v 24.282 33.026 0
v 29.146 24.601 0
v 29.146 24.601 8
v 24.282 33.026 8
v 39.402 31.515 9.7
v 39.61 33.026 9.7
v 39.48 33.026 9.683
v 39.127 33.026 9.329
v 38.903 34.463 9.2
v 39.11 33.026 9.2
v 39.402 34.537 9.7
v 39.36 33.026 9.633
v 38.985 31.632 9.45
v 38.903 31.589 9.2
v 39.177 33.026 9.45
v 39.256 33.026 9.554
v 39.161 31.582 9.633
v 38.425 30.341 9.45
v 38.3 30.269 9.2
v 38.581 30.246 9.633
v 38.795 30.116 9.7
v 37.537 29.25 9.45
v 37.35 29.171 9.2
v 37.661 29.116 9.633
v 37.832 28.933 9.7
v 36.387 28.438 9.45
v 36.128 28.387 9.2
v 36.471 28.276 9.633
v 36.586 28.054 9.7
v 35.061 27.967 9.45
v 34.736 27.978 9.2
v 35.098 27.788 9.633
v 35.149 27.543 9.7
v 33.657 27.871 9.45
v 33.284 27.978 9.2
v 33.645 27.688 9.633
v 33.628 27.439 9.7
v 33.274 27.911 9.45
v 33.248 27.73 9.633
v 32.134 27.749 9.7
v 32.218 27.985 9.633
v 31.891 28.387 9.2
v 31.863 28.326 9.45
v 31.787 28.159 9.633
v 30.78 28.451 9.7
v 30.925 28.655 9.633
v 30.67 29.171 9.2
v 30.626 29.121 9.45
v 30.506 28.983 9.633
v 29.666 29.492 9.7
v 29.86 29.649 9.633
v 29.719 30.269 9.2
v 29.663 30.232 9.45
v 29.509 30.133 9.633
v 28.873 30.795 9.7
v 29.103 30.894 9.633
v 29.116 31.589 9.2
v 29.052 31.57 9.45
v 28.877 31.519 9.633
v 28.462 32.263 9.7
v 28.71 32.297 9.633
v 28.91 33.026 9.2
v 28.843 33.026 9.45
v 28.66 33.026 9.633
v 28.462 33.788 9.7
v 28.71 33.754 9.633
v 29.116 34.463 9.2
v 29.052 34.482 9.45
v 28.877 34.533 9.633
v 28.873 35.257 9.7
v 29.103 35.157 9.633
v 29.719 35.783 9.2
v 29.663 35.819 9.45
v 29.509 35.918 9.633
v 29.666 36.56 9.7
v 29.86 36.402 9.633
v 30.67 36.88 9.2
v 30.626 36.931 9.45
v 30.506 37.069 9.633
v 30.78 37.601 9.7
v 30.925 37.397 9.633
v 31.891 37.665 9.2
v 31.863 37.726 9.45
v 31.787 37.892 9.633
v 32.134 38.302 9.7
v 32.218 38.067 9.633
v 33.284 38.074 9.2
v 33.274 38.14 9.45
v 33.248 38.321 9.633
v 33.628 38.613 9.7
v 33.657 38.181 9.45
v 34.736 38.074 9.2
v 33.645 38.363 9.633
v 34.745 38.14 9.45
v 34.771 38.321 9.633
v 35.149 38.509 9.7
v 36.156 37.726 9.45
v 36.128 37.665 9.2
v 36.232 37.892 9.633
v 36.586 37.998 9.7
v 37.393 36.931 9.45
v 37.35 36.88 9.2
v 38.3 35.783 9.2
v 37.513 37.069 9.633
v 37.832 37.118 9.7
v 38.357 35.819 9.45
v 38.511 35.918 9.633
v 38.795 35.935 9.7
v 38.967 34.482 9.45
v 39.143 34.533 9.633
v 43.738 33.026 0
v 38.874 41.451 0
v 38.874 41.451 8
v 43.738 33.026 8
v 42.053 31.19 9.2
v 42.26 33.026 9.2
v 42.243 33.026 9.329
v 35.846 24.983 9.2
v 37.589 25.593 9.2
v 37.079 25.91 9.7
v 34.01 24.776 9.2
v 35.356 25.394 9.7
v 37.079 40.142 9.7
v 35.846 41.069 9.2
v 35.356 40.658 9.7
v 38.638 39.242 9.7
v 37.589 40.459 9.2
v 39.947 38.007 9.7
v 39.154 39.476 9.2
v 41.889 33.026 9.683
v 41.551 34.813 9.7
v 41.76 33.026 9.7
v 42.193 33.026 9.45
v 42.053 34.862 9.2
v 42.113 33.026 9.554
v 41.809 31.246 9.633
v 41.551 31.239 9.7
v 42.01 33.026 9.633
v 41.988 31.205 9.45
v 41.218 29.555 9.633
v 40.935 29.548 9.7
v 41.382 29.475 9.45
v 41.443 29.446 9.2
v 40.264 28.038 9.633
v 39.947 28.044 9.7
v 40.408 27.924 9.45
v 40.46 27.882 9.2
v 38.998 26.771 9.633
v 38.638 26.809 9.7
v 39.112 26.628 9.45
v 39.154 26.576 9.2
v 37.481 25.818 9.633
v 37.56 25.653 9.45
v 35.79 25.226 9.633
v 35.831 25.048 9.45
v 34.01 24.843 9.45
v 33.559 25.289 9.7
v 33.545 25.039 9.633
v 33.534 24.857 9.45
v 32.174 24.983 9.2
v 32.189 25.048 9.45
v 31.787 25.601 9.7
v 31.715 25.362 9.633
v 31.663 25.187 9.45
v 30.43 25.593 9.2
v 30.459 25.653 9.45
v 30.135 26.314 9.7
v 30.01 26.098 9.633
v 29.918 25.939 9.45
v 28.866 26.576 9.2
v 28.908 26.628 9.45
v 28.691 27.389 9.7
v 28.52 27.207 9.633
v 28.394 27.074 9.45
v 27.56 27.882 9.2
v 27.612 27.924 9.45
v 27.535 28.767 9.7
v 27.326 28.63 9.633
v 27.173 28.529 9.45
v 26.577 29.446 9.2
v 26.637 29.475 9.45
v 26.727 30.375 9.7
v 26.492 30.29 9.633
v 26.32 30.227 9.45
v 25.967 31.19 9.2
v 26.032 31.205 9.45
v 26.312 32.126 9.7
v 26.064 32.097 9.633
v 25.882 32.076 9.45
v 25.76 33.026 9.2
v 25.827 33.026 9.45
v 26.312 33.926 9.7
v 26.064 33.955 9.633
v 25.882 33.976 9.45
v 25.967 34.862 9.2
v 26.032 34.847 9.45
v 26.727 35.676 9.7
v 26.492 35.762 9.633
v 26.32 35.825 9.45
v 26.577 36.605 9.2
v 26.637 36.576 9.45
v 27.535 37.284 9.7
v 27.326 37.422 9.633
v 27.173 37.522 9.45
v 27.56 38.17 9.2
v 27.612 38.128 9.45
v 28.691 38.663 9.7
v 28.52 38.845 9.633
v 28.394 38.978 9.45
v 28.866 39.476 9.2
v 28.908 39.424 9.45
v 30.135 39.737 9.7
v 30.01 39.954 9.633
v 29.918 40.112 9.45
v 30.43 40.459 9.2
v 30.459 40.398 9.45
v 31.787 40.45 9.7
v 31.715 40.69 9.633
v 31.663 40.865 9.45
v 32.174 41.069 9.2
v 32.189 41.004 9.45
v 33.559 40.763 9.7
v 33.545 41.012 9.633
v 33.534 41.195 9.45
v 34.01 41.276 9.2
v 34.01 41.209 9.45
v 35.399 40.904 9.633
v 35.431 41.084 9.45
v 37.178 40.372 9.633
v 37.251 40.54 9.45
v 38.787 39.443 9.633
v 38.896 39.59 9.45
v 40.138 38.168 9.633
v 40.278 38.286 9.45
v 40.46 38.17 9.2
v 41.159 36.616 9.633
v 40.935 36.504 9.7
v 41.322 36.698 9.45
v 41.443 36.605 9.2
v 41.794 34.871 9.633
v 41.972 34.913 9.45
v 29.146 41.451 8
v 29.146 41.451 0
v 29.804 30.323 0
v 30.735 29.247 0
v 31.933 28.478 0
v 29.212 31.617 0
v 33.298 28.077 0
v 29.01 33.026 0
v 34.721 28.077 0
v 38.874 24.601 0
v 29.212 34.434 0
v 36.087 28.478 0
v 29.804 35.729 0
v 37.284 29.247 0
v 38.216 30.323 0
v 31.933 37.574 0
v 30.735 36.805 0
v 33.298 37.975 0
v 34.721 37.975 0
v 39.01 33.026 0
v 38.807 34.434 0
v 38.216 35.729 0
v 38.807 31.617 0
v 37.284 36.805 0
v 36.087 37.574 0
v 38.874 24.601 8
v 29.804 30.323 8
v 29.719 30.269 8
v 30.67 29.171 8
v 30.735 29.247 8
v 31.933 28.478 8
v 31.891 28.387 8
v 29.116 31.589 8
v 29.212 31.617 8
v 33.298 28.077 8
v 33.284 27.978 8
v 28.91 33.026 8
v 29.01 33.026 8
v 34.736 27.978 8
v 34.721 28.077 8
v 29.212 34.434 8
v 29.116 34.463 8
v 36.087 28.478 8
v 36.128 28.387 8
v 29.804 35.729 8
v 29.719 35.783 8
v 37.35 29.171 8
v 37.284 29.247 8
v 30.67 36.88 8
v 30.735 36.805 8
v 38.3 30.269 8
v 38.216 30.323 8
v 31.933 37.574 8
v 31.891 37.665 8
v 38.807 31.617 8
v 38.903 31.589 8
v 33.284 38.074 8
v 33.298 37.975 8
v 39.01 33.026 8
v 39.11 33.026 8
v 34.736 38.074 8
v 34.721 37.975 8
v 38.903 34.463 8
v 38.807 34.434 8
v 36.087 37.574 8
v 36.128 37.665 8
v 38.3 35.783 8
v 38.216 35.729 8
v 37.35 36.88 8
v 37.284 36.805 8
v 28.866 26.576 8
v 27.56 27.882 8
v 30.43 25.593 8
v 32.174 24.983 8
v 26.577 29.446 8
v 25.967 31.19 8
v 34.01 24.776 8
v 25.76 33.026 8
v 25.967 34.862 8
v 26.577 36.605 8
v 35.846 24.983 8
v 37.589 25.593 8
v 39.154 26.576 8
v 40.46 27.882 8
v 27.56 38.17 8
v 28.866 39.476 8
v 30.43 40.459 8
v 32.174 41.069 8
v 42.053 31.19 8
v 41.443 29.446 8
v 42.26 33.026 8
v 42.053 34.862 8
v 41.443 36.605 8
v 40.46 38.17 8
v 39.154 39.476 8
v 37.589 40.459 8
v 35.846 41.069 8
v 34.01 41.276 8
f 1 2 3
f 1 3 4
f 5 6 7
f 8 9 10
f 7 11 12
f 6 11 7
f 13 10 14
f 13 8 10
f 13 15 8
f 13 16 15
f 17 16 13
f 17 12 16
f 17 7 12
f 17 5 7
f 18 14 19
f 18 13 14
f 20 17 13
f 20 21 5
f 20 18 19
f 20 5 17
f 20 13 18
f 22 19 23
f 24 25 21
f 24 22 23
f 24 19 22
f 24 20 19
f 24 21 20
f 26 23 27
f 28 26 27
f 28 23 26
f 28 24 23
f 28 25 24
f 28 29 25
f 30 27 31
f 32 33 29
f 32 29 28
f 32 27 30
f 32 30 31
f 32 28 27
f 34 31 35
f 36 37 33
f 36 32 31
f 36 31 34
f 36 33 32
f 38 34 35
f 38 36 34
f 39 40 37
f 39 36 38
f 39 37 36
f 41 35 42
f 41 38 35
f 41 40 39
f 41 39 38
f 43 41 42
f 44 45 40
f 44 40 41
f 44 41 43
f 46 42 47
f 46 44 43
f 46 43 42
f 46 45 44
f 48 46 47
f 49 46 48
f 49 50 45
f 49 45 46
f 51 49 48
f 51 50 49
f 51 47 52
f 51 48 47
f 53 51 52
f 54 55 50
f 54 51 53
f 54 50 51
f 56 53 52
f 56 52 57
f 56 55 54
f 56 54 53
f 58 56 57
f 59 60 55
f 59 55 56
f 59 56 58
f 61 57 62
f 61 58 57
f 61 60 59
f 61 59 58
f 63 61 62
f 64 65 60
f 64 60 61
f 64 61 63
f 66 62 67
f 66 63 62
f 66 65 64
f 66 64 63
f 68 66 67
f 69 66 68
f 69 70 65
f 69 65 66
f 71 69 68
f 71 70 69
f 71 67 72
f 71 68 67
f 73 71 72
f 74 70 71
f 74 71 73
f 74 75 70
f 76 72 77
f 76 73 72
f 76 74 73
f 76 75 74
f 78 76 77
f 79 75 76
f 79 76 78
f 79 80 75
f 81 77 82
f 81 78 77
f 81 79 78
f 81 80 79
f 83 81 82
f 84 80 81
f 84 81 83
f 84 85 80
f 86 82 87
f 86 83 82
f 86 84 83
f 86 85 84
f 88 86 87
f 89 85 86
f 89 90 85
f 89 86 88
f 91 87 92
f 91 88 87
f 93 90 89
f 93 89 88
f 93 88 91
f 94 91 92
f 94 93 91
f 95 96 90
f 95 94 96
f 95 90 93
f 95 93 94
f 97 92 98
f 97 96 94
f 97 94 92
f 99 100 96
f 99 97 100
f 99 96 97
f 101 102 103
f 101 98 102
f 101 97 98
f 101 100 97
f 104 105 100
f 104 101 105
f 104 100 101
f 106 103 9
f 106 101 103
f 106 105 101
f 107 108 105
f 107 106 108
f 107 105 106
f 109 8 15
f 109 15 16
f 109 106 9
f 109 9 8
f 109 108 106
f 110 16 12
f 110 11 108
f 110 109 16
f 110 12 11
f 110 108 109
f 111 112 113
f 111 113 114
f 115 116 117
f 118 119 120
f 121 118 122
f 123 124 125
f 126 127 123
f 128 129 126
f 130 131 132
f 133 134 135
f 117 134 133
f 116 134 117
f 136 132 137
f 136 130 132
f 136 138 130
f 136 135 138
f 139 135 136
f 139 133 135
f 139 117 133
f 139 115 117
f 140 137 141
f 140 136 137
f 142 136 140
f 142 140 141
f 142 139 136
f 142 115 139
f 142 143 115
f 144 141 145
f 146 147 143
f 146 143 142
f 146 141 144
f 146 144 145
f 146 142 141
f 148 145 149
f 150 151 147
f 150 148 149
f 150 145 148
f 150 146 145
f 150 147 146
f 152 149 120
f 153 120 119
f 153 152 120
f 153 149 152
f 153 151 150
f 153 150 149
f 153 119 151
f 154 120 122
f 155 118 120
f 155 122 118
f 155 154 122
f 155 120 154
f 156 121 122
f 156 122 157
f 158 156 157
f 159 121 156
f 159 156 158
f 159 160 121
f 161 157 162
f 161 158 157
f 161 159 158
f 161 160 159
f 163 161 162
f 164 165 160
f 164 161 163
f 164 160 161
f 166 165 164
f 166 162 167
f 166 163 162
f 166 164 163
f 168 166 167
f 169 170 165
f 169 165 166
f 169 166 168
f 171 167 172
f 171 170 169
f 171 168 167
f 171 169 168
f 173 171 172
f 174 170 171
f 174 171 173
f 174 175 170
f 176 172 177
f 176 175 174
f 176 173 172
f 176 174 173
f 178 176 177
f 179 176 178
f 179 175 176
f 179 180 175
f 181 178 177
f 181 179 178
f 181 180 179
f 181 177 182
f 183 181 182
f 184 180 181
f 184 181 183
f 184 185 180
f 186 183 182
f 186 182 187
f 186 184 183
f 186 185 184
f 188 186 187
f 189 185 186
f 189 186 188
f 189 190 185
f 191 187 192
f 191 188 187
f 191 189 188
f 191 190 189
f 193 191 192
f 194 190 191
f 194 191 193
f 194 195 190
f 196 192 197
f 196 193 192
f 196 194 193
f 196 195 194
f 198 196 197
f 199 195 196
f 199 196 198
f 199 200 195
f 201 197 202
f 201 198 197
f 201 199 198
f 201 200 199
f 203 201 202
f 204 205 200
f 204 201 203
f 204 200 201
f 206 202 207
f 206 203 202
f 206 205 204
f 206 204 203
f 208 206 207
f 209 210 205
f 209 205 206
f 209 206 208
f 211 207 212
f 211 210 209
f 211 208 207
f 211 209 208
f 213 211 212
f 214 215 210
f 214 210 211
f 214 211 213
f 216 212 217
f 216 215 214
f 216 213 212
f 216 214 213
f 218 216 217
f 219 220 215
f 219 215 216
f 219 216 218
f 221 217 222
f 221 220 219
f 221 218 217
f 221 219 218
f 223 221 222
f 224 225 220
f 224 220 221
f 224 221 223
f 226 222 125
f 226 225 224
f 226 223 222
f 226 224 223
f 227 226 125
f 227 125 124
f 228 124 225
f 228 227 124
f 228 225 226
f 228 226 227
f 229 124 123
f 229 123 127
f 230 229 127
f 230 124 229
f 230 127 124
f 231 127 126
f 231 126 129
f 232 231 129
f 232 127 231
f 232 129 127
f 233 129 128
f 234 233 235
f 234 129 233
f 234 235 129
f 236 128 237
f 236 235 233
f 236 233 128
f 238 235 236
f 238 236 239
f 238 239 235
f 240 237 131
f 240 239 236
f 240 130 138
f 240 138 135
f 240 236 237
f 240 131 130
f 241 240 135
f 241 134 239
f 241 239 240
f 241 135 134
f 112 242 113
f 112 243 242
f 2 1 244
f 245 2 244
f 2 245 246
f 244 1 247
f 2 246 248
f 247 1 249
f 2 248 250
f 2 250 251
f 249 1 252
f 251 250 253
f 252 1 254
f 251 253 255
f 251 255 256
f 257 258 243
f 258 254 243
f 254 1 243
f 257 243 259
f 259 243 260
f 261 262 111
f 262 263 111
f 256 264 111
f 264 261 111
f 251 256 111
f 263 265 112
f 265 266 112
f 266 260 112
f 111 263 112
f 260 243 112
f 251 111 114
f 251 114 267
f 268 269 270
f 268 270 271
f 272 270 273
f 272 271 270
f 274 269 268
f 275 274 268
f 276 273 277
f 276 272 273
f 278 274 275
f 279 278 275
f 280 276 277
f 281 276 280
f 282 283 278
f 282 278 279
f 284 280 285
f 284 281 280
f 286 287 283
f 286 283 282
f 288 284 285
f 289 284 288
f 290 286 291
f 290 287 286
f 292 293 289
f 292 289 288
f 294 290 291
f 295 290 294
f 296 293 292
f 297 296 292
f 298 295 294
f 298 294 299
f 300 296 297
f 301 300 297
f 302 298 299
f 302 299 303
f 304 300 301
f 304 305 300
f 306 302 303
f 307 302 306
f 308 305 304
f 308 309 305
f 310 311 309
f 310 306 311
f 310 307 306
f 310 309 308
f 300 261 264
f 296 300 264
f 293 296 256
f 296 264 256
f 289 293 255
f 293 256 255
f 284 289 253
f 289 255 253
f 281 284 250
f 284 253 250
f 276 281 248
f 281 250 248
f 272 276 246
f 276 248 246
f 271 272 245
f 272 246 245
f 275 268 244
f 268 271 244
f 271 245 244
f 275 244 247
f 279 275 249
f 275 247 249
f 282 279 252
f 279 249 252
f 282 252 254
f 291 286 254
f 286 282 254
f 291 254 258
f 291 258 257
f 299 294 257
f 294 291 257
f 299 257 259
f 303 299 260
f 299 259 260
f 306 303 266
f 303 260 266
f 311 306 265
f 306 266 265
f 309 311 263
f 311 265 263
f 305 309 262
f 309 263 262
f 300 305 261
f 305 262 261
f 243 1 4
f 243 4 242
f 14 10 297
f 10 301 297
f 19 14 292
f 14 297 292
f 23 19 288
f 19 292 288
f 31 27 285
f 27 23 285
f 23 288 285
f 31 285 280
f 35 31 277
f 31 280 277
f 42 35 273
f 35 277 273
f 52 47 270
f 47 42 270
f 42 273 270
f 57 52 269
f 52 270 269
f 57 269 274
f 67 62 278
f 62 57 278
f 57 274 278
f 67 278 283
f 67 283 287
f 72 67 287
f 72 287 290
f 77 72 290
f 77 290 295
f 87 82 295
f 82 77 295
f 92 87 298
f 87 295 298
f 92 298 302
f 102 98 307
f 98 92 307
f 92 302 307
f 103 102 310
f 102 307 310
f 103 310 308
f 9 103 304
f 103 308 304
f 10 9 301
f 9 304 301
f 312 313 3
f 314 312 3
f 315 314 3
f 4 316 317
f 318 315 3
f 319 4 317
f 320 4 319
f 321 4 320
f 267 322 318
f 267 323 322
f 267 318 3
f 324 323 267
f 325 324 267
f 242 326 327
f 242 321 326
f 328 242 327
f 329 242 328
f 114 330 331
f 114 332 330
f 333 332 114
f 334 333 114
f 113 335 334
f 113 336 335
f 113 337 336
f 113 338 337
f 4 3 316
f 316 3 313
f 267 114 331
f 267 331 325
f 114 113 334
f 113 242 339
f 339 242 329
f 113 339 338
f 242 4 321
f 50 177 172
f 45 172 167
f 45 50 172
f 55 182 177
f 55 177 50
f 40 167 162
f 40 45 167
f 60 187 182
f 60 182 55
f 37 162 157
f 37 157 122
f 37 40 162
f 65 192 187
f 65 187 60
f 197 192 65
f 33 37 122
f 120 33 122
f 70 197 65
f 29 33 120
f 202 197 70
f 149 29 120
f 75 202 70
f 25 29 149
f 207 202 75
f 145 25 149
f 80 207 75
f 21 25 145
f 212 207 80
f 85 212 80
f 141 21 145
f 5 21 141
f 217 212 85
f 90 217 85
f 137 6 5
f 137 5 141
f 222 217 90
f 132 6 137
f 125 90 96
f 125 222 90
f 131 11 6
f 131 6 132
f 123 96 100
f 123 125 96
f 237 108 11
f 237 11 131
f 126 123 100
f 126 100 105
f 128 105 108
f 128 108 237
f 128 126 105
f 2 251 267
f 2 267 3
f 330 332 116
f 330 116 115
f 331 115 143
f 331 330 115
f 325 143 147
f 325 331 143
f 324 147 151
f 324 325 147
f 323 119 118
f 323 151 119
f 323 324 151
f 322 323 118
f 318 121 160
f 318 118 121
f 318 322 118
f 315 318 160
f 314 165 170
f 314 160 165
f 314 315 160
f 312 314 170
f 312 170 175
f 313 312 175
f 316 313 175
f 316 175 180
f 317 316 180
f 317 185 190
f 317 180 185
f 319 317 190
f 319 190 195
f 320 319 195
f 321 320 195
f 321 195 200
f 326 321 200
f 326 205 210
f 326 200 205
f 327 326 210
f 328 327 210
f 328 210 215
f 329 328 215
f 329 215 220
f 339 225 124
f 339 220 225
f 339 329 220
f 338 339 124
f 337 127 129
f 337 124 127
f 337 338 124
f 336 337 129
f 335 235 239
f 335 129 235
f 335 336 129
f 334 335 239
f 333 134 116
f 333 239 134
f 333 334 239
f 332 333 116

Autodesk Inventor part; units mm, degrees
ref_plane "YZ Plane" through (0, 0, 0) normal (1, 0, 0) x (0, 1, 0)
ref_plane "XZ Plane" through (0, 0, 0) normal (0, 1, 0) x (-1, 0, 0)
sketch "Sketch1" plane through (0, 0, 0) normal (0, 0, 1) x (1, 0, 0)
  circle A0 centre (34.0098, 33.0258) radius 5
  circle A1 centre (34.0098, 33.0258) radius 8.425
  line L0 (38.874, 41.4508) -> (43.7382, 33.0258)
  line L1 (43.7382, 33.0258) -> (38.874, 24.6008)
  line L2 (38.874, 24.6008) -> (29.1457, 24.6008)
  line L3 (29.1457, 24.6008) -> (24.2815, 33.0258)
  line L4 (24.2815, 33.0258) -> (29.1457, 41.4508)
  line L5 (29.1457, 41.4508) -> (38.874, 41.4508)
  point P0 (34.0098, 41.4508)
  dimension "d1" = 16.85
  dimension "d0" = 10
extrude "Extrusion1" add sketch "Sketch1" along normal blind 8
ref_plane "Work Plane1" through (34.0098, 33.0258, 0) normal (0.866, -0.5, 0) x (0, 0, 1)
thread "Thread1" size "M10x1.5" class "6H" standard "ANSI Metric M Profile" full length
sketch "Sketch4" plane through (0, 0, 8) normal (0, 0, 1) x (1, 0, 0)
  circle A0 centre (34.0098, 33.0258) radius 5 projected
  circle A1 centre (34.0098, 33.0258) radius 8.25
  circle A2 centre (34.0098, 33.0258) radius 5.1
  dimension "d11" = 16.5
  dimension "d12" = 10.2
extrude "Extrusion2" add sketch "Sketch4" along normal blind 1.7 contours A1
fillet "Fillet1" radius 0.5 2 edges at (28.9098, 33.0258, 9.7) (25.7598, 33.0258, 9.7)
properties part number "M10 Nut (o'ring)"
